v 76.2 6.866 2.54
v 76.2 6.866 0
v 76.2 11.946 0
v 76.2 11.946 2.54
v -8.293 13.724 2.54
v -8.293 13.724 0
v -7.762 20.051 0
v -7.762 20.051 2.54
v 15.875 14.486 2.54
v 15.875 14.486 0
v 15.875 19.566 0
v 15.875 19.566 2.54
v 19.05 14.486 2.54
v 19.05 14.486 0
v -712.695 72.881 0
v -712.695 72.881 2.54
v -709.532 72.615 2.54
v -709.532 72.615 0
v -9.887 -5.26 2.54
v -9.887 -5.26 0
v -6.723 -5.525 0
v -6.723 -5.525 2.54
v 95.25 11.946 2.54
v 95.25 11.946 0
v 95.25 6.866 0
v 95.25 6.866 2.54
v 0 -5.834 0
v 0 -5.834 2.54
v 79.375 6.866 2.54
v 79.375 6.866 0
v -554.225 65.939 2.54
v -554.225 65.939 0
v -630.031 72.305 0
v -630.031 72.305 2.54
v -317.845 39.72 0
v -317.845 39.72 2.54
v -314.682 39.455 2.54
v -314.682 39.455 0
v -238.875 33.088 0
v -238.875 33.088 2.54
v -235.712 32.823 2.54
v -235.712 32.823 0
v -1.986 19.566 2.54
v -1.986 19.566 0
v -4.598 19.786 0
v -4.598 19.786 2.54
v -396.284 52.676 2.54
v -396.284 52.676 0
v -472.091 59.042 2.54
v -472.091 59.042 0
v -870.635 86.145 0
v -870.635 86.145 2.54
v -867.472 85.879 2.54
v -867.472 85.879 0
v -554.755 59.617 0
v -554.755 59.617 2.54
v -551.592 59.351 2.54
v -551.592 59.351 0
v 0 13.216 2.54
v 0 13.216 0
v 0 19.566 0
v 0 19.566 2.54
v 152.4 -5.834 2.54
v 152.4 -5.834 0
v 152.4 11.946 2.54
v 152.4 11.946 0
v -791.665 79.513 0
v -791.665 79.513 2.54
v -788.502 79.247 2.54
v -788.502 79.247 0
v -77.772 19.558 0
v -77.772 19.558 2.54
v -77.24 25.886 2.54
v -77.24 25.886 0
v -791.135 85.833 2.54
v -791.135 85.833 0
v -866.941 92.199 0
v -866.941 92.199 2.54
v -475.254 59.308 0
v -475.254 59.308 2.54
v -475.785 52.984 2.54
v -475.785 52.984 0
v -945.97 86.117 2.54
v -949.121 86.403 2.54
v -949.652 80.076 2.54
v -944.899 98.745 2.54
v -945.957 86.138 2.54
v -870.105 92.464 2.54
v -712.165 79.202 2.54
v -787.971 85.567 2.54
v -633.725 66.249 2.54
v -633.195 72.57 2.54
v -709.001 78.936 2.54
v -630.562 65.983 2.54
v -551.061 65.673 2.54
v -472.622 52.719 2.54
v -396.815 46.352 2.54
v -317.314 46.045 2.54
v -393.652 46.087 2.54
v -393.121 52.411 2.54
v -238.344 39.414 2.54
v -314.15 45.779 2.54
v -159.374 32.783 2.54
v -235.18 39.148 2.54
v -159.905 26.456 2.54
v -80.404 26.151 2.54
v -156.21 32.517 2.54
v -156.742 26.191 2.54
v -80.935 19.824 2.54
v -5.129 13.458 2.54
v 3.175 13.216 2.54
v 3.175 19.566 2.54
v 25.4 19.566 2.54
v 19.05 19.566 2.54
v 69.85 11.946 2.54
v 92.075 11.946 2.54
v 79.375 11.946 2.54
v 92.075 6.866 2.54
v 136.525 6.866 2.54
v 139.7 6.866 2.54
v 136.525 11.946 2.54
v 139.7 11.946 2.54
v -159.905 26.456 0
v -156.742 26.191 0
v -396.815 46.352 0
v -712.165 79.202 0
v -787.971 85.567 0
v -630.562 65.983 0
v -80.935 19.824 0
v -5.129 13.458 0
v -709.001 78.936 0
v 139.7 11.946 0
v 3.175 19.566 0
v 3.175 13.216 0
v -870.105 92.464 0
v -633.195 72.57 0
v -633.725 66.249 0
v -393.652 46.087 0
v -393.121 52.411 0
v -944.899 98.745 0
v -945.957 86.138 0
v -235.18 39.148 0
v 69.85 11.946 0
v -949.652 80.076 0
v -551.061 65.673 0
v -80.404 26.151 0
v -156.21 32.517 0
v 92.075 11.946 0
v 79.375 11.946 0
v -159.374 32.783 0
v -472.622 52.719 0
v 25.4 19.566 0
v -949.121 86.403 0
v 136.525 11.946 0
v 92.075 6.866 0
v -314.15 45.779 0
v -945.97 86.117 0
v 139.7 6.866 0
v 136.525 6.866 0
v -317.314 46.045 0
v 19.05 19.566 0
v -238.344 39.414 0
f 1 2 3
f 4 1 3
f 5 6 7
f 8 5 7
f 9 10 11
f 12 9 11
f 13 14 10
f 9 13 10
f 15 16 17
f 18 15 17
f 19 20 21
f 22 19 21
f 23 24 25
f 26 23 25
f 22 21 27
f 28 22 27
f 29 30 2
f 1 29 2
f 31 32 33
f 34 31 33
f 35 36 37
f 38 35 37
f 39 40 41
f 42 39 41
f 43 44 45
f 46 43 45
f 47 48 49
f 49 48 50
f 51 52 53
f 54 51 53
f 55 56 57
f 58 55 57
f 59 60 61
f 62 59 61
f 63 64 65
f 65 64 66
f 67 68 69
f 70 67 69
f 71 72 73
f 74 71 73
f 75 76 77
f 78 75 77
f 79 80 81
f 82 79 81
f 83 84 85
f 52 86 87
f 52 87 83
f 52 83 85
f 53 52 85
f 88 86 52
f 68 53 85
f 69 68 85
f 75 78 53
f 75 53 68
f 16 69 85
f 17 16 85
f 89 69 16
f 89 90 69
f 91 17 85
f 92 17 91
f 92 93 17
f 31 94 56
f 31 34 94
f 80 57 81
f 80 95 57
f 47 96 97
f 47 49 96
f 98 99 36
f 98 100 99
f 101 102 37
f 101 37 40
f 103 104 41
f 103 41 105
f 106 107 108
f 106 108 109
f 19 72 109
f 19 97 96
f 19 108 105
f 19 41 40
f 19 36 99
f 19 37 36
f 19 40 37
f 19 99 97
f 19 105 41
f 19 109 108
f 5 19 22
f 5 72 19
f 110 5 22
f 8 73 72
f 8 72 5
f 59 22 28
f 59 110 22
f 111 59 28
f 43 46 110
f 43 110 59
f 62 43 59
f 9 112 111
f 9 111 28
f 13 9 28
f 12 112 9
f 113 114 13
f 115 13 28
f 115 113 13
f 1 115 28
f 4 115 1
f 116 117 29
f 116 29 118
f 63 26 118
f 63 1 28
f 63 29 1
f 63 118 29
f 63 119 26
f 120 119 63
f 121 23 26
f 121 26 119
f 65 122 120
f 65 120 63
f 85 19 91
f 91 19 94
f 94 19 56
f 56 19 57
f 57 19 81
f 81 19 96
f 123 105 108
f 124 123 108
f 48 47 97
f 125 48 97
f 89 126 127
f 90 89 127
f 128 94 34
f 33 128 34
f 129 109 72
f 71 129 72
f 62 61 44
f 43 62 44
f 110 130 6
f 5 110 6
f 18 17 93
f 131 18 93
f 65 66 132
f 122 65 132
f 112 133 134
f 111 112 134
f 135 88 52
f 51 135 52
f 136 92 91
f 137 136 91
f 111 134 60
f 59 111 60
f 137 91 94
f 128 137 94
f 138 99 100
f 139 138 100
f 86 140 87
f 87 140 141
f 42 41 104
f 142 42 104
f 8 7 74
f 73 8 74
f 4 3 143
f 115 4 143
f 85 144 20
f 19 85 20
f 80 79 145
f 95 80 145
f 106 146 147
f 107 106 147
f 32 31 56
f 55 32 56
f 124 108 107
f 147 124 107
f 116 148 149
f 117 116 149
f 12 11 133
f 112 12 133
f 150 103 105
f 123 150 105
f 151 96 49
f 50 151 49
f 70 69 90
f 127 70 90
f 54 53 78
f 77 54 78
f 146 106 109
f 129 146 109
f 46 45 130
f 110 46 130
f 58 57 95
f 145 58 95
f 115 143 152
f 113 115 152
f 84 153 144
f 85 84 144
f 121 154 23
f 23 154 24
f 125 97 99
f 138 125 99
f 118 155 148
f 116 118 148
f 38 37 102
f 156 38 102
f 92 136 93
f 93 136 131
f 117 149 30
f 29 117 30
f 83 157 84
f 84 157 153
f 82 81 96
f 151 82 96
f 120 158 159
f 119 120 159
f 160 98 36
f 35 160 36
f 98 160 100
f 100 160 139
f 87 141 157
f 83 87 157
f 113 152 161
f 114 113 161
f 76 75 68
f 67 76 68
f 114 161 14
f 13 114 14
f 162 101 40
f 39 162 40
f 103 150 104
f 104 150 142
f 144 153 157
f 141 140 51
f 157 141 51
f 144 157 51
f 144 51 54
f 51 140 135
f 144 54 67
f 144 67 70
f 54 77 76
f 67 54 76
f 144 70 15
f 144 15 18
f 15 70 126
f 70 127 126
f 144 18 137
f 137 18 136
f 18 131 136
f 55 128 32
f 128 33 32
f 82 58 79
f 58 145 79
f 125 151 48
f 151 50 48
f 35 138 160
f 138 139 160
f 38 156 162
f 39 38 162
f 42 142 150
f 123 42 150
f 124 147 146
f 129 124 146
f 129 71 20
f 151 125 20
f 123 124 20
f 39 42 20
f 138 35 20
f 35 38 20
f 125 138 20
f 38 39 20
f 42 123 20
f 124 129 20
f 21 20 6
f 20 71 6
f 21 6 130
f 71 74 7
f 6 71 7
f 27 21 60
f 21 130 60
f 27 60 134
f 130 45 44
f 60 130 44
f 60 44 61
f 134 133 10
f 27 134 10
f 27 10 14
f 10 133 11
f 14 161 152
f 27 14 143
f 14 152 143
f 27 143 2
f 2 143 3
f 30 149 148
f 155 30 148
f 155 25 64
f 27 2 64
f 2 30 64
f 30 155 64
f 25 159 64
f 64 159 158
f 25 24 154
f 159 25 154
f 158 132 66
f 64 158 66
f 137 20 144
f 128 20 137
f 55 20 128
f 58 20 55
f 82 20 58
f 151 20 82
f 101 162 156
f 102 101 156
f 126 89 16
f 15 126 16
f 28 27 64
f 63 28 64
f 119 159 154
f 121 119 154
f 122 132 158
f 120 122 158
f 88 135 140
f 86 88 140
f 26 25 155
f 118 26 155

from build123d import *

# Parameters (mm, degrees)
BOSS_EXTRUDE1_DEPTH     = 2.54
CUT_EXTRUDE1_DEPTH      = 1
CUT_EXTRUDE1_DEPTH_BACK = 3.54


with BuildPart() as part:
    # Sketch1 → Boss-Extrude1 (new body)
    with BuildSketch(Plane.XY):
        Polygon((-945.957227657, 86.137779906), (-945.969713578, 86.1172966), (-949.121092485, 86.403457059), (-949.65244679, 80.075727402), (-9.887238192, -5.25964904), (-6.723373364, -5.525326193), (0, -5.833733414), (152.4, -5.833733414), (152.4, 11.946266586), (139.7, 11.946266586), (139.7, 6.866266586), (136.525, 6.866266586), (136.525, 11.946266586), (95.25, 11.946266586), (95.25, 6.866266586), (92.075, 6.866266586), (92.075, 11.946266586), (79.375, 11.946266586), (79.375, 6.866266586), (76.2, 6.866266586), (76.2, 11.946266586), (69.85, 11.946266586), (25.4, 19.566266586), (19.05, 19.566266586), (19.05, 14.486266586), (15.875, 14.486266586), (15.875, 19.566266586), (3.175, 19.566266586), (3.175, 13.216266586), (0, 13.216266586), (0, 19.566266586), (-1.98607431, 19.566266586), (-4.597956143, 19.785592432), (-5.129310448, 13.457862776), (-8.293175277, 13.723539928), (-7.761820971, 20.051269584), (-944.89858306, 98.744842179), align=None)
    extrude(amount=BOSS_EXTRUDE1_DEPTH)

    # Sketch2 → Cut-Extrude1 (cut, two sides)
    with BuildSketch(Plane.XY.offset(2.54)) as cut_extrude1_sk:
        Polygon((-77.240292597, 25.885539855), (-80.404157425, 26.151217008), (-80.935453586, 19.824179771), (-77.77159129, 19.55847246), align=None)
        Polygon((-156.741594191, 26.190526923), (-156.210358707, 32.516841584), (-159.374223535, 32.782518736), (-159.905456487, 26.456234233), align=None)
        Polygon((-235.711597092, 32.822581386), (-235.180424816, 39.148143312), (-238.344289645, 39.413820465), (-238.875459388, 33.088288696), align=None)
        Polygon((-314.681599993, 39.454635849), (-314.150490926, 45.77944504), (-317.314355754, 46.045122193), (-317.845462289, 39.720343159), align=None)
        Polygon((-393.651602894, 46.086690311), (-393.120557036, 52.410746769), (-396.284421864, 52.676423921), (-396.81546519, 46.352397622), align=None)
        Polygon((-472.621605795, 52.718744774), (-472.090623146, 59.042048497), (-475.254487974, 59.30772565), (-475.785468091, 52.984452084), align=None)
        Polygon((-551.591608696, 59.350799237), (-551.060689256, 65.673350226), (-554.224554084, 65.939027378), (-554.755470992, 59.616506547), align=None)
        Polygon((-630.561611597, 65.9828537), (-630.030755365, 72.304651954), (-633.194620194, 72.570329107), (-633.725473893, 66.24856101), align=None)
        Polygon((-709.531614498, 72.614908162), (-709.000821475, 78.935953682), (-712.164686303, 79.201630835), (-712.695476794, 72.880615473), align=None)
        Polygon((-788.501617399, 79.246962625), (-787.970887585, 85.567255411), (-791.134752413, 85.832932563), (-791.665479694, 79.512669935), align=None)
        Polygon((-867.4716203, 85.879017088), (-866.940953695, 92.198557139), (-870.104818523, 92.464234292), (-870.635482595, 86.144724398), align=None)
    extrude(amount=CUT_EXTRUDE1_DEPTH, mode=Mode.SUBTRACT)
    extrude(cut_extrude1_sk.sketch, amount=-CUT_EXTRUDE1_DEPTH_BACK, mode=Mode.SUBTRACT)


solid = part.part
